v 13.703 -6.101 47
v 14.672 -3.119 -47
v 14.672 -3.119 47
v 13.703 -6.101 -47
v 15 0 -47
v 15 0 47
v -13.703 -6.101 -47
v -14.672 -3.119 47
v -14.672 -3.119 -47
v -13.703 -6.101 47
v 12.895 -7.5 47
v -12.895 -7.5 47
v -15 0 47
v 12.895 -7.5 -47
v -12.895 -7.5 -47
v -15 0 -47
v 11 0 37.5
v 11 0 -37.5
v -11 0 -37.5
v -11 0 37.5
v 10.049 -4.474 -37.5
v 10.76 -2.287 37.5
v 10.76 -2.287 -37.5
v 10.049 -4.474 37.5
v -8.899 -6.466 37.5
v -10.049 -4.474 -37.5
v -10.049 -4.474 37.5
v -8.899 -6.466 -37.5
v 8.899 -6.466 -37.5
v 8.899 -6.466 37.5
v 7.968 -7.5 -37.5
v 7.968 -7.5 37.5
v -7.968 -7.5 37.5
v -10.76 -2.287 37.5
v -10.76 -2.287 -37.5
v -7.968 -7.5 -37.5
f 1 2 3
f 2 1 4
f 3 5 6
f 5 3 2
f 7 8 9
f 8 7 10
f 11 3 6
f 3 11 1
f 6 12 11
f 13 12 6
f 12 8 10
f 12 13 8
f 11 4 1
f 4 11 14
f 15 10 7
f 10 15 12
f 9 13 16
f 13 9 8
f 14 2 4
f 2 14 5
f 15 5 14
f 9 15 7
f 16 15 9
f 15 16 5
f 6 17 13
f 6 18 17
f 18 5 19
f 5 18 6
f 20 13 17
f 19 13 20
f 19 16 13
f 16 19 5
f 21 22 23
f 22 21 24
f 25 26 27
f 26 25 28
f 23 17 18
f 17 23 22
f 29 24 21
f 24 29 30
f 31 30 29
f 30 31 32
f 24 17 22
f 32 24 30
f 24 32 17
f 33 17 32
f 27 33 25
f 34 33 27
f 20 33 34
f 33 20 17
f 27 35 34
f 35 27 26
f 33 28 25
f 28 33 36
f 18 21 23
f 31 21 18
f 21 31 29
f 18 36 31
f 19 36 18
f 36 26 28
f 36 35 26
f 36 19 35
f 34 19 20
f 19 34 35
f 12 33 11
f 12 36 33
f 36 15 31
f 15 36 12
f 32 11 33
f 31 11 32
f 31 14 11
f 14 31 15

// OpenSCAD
radius = 22 / 2;
thickness = 1.5;

numbers = 50;
outsite = 30 / 2;
shell = 94;

height = thickness * numbers;
difference(){
    cylinder(h = shell, r = outsite, center = true);
    translate([0, outsite/2, 0]){
        cube([outsite*2, outsite, shell*2], center = true);
    }
    cylinder(h = height, r = radius, center = true);
    translate([0, -(outsite*2)/2, 0]){
        cube([outsite*2, outsite, shell*2], center = true);
    }
}
